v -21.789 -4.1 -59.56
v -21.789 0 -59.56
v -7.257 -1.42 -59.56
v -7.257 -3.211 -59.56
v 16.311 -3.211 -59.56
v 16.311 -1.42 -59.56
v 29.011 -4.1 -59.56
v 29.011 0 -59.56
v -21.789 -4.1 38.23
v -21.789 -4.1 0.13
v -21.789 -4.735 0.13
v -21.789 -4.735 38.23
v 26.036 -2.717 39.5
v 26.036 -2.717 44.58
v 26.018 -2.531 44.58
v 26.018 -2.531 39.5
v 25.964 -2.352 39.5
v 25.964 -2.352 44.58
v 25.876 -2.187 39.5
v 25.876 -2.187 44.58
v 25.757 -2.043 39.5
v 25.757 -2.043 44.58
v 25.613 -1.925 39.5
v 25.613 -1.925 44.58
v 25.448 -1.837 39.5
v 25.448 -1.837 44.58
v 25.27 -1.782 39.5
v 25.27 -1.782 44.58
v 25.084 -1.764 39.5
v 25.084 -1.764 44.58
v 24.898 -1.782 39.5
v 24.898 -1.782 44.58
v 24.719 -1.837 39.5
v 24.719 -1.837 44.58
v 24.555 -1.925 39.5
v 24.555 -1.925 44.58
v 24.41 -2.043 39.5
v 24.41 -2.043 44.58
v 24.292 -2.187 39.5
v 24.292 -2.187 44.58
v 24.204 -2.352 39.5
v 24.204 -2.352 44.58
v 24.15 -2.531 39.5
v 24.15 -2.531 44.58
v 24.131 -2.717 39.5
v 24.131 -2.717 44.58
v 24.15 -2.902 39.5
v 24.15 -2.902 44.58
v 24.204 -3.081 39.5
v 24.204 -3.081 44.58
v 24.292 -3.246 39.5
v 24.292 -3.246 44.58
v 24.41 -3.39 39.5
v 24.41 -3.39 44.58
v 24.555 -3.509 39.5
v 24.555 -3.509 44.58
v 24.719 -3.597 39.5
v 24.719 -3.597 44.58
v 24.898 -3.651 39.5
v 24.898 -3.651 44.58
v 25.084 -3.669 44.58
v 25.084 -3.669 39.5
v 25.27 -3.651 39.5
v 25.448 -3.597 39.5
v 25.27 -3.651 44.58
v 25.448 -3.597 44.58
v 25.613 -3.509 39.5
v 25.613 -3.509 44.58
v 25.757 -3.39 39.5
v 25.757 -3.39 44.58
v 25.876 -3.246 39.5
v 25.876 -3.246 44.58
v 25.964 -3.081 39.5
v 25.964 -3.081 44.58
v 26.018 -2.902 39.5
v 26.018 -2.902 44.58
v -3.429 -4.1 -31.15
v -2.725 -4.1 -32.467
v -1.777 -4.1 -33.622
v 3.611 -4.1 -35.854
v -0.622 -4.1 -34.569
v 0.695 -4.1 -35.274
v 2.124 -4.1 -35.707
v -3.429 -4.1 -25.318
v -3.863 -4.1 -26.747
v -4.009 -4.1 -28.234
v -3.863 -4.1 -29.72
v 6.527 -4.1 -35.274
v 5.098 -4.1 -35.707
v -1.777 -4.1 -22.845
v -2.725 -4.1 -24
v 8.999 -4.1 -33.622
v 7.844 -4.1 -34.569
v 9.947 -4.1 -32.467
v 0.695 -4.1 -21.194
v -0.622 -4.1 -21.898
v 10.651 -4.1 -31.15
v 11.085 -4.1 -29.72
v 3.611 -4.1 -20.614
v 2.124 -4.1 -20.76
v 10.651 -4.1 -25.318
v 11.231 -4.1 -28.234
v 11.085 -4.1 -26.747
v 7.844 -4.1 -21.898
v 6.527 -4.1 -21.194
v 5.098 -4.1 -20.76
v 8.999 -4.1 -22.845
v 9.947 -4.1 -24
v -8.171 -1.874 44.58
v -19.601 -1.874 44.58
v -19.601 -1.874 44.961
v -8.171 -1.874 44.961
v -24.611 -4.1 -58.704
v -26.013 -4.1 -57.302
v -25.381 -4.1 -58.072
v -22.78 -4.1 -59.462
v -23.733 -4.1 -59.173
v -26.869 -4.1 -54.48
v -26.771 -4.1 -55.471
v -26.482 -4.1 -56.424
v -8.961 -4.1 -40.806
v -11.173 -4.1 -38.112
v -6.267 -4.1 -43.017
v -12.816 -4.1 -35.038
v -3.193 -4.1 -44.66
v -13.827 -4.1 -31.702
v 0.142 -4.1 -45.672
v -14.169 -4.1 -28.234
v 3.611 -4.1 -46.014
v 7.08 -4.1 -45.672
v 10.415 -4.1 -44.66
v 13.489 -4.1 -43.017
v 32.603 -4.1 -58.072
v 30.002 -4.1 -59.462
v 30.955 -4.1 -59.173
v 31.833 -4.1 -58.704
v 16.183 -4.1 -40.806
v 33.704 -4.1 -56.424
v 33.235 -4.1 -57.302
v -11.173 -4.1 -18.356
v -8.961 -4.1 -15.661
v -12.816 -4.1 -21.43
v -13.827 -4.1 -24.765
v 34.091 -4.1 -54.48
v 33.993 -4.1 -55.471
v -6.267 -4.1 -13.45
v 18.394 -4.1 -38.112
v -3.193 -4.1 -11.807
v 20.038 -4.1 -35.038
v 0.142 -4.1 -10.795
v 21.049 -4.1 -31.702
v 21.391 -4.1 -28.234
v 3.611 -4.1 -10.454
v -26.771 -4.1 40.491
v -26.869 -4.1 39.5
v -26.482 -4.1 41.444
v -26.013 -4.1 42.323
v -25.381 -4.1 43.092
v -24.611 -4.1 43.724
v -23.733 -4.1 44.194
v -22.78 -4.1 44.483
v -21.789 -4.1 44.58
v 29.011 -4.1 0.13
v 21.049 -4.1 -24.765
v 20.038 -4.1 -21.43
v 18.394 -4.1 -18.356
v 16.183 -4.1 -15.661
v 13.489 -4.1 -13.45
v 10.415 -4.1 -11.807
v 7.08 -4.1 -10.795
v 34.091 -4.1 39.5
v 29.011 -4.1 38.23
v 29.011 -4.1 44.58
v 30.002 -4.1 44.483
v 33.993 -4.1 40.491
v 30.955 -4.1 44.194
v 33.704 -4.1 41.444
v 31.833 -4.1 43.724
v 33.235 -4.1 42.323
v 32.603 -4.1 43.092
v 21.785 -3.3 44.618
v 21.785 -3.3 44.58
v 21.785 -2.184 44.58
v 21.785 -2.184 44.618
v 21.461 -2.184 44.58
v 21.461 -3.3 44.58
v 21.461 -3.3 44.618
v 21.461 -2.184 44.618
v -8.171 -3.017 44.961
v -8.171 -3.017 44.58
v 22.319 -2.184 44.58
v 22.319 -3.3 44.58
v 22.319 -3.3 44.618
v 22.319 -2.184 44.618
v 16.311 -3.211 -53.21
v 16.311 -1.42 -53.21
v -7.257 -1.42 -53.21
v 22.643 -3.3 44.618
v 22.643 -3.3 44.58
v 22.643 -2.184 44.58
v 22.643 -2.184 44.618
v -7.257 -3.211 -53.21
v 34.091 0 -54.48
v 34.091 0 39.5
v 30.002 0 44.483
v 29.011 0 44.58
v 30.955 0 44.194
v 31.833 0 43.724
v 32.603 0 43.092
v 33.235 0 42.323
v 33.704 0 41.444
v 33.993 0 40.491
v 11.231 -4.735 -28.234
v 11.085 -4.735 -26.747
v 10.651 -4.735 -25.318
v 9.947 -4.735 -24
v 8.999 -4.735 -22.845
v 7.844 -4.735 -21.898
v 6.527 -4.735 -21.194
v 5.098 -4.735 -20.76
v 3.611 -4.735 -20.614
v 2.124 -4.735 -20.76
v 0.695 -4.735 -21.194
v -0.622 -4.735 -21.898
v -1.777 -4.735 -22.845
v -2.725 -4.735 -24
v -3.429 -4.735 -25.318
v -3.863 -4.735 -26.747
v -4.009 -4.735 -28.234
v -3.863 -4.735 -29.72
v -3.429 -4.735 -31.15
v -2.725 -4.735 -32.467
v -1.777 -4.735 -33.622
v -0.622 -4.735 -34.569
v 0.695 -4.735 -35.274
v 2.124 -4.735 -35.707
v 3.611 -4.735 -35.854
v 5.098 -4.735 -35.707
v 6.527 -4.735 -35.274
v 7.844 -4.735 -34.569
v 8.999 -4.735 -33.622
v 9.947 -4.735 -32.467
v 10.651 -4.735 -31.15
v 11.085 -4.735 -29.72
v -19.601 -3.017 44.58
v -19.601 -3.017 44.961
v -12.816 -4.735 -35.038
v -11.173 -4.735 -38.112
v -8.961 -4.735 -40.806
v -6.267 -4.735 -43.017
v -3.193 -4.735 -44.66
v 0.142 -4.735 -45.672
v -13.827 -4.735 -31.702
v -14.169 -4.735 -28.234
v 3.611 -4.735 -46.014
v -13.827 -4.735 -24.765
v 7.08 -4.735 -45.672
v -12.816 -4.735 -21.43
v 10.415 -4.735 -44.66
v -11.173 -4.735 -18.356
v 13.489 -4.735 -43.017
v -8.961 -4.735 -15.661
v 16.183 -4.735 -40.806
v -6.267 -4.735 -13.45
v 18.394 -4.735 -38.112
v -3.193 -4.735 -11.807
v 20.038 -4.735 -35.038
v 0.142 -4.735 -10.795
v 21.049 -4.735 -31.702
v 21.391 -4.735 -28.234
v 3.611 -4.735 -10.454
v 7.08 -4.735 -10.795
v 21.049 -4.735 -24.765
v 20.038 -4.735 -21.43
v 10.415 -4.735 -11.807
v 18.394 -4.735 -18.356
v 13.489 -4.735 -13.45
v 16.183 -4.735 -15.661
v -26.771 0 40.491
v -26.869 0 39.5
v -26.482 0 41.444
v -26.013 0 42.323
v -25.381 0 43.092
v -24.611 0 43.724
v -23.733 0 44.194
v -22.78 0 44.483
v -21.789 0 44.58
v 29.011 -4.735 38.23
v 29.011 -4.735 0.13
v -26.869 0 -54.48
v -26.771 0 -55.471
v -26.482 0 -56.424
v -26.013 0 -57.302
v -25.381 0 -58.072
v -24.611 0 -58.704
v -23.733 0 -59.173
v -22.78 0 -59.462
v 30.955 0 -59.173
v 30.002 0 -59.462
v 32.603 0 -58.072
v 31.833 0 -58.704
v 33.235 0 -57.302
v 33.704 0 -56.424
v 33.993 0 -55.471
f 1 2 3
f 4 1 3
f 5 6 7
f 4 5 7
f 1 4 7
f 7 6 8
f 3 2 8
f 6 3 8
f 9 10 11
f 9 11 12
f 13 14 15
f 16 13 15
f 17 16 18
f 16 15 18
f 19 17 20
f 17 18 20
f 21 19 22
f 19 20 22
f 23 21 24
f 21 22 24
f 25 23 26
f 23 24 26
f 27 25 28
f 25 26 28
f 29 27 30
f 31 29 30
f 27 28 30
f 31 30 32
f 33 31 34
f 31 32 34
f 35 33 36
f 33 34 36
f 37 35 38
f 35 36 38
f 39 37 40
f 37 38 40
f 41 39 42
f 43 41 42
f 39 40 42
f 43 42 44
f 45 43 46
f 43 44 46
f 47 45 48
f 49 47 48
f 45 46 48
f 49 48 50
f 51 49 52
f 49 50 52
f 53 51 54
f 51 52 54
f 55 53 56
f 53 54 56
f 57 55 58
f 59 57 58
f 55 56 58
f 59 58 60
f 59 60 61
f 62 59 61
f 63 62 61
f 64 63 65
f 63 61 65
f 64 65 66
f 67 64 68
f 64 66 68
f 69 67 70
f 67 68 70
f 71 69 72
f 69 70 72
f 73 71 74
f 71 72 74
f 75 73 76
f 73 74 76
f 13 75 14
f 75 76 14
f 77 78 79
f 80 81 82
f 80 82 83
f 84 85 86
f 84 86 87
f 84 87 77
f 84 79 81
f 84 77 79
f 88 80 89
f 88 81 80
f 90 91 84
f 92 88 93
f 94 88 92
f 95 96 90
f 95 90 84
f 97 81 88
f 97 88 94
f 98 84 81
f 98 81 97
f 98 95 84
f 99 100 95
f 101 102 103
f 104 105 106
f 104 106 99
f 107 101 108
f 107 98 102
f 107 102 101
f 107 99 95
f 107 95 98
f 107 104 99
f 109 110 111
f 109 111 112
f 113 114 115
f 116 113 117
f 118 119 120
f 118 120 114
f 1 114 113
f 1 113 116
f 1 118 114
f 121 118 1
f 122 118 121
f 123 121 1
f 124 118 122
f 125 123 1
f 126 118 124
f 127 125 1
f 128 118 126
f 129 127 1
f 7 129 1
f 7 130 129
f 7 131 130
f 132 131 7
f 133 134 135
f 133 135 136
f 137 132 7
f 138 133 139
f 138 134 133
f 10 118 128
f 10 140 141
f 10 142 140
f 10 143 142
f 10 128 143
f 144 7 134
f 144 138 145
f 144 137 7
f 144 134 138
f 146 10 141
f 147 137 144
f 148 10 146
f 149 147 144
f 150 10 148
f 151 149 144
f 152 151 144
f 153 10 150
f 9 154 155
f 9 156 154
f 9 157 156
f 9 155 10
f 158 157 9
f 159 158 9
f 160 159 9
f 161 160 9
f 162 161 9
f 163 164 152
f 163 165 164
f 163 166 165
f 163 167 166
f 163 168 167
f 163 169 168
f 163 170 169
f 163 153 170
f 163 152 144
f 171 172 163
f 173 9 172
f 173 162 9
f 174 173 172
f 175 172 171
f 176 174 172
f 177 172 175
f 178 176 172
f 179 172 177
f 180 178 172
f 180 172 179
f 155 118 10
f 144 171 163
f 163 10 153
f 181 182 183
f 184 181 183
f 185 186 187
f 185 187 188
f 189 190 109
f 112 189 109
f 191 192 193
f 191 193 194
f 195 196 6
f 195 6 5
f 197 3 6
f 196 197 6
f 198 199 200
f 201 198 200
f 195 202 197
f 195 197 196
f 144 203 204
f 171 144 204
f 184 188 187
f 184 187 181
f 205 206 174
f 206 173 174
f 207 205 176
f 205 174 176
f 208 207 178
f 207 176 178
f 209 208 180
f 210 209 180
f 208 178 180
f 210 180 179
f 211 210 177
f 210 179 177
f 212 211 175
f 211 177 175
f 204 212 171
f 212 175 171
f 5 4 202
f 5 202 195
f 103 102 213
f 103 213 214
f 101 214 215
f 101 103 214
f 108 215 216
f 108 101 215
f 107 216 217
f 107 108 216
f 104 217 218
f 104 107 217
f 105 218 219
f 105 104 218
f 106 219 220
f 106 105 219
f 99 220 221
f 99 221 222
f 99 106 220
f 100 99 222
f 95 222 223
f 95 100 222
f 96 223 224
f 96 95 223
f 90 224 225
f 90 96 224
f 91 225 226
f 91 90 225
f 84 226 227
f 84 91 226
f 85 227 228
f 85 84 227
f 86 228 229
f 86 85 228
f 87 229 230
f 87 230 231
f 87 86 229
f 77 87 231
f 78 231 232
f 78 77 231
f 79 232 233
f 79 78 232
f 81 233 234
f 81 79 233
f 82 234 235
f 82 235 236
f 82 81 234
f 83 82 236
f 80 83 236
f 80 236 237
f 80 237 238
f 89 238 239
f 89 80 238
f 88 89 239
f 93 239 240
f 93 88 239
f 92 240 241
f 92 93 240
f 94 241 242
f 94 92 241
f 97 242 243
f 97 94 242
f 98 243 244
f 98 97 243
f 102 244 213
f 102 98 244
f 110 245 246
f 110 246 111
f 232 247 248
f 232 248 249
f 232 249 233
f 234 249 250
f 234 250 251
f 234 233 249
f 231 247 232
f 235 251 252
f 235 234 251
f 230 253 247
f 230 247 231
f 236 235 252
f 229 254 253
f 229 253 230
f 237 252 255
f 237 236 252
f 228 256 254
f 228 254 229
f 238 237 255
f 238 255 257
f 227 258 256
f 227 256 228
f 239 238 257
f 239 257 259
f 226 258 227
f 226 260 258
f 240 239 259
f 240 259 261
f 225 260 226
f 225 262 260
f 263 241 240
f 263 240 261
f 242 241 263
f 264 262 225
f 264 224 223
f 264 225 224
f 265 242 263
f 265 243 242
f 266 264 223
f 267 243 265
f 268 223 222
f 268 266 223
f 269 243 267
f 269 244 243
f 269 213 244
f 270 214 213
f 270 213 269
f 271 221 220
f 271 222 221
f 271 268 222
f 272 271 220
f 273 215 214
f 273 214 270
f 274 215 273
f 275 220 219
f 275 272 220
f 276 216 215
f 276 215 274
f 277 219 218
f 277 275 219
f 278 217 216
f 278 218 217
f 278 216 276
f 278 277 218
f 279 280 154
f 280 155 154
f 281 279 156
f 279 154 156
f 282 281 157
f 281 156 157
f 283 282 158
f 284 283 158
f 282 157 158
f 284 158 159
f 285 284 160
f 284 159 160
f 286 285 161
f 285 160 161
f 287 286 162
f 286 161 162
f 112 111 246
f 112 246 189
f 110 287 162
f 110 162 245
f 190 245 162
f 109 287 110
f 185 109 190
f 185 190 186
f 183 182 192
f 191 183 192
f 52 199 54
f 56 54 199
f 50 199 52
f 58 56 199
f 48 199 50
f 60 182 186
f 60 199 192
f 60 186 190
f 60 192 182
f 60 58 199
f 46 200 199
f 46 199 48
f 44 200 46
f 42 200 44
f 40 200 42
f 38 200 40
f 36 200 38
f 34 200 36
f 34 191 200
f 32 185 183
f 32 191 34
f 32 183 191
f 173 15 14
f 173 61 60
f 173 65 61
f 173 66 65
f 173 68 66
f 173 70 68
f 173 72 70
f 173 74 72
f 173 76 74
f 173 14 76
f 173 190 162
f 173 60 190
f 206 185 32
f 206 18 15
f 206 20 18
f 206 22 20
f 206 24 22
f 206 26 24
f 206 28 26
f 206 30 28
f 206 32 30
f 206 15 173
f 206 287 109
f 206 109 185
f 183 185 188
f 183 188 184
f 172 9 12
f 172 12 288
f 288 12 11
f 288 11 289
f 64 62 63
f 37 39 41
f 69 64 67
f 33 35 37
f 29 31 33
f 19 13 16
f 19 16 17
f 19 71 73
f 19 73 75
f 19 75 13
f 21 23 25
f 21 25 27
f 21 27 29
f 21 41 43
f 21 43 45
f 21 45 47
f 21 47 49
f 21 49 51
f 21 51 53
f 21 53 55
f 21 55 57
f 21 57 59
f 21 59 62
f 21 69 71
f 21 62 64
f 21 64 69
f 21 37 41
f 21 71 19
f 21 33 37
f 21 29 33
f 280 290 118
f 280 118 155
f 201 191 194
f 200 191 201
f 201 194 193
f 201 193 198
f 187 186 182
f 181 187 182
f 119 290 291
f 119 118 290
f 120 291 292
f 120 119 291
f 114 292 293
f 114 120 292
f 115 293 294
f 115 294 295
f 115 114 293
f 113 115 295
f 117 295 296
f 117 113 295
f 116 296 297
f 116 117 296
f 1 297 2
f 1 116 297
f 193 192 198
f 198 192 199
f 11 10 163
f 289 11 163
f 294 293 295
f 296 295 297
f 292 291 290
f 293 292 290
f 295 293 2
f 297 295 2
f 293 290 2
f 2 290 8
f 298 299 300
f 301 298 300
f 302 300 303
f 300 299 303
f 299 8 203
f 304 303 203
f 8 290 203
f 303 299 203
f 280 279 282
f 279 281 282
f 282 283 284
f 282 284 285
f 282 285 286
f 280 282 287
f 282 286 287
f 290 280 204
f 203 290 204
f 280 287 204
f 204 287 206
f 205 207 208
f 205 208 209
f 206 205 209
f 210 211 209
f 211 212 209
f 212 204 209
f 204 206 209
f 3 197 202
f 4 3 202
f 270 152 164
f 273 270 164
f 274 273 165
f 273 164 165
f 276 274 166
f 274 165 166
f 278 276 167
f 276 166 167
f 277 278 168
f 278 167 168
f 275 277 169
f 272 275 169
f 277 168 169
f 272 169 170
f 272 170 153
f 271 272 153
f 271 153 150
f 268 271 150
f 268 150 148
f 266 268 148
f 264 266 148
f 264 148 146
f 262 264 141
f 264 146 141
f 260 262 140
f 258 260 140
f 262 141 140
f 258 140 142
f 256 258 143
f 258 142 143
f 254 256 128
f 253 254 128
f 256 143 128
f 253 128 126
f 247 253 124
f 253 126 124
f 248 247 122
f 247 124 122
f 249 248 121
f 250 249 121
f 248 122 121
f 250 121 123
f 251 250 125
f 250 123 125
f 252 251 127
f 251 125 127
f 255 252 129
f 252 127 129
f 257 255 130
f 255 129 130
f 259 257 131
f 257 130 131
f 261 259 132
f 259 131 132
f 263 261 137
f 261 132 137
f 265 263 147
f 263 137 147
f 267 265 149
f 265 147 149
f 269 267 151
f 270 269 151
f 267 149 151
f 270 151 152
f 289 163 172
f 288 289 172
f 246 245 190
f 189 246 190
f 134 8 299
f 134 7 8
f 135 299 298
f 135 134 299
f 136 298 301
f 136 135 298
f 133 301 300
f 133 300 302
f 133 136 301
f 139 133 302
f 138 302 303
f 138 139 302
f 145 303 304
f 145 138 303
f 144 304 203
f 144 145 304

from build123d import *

# Parameters (mm, degrees)
F0_W      = 60.96
F0_H      = 104.14
F1_DEPTH  = 4.1
F2_W      = 50.8
F2_H      = 38.1
F2_R      = 17.78
F2_R_2    = 7.62
F3_DEPTH  = 0.635
F4_R      = 5.08
F5_R      = 1.27
F6_DEPTH  = 3.81
F7_W      = 0.127
F7_H      = 0.635
F7_H_2    = 0.641739
F8_DEPTH  = 0.0635
F9_W      = 23.568134
F9_H      = 1.790789
F10_DEPTH = 6.35
F11_W     = 11.43
F11_H     = 1.143
F12_DEPTH = 0.381
F13_R     = 0.9525
F14_DEPTH = 5.08
F15_W     = 0.323782
F15_H     = 1.115247
F15_W_2   = 0.323781
F16_DEPTH = 0.0381


with BuildPart() as f1:
    # F0 (on Front) → F1 (new body)
    with BuildSketch(Plane.XZ):
        with Locations((3.610969, -7.489684)):
            Rectangle(F0_W, F0_H)
    extrude(amount=F1_DEPTH)

    # F2 (on face) → F3 (join)
    with BuildSketch(Plane.XZ.offset(4.1)):
        with Locations((3.610969, 19.180316)):
            Rectangle(F2_W, F2_H)
        with Locations((3.610969, -28.233618)):
            Circle(F2_R)
        with Locations((3.610969, -28.233618)):
            Circle(F2_R_2, mode=Mode.SUBTRACT)
    extrude(amount=F3_DEPTH)

    # F4
    f4_edges = [f1.edges().sort_by_distance(p)[0] for p in [
        (-26.869031, -2.05, 44.580316),
        (34.090969, -2.05, 44.580316),
        (34.090969, -2.05, -59.559684),
        (-26.869031, -2.05, -59.559684),
    ]]
    fillet(f4_edges, radius=F4_R)

    # F5 (on face) → F6 (cut)
    with BuildSketch(Plane.XY.offset(44.580316)):
        with Locations((25.835969, -8.355387)):
            Circle(F5_R)
    extrude(amount=-F6_DEPTH, mode=Mode.SUBTRACT)

    # F7 (on face) → F8 (cut)
    with BuildSketch(Plane.XY.offset(44.580316)):
        with Locations((23.406764, -8.501846)):
            Rectangle(F7_W, F7_H)
        with Locations((23.75507, -8.505765)):
            Rectangle(F7_W, F7_H_2)
    extrude(amount=-F8_DEPTH, mode=Mode.SUBTRACT)

    # F9 (on face) → F10 (cut)
    with BuildSketch(Plane(origin=(0, 0, -59.559684), x_dir=(1, 0, 0), z_dir=(0, 0, -1))):
        with Locations((4.526902, 2.315605)):
            Rectangle(F9_W, F9_H)
    extrude(amount=-F10_DEPTH, mode=Mode.SUBTRACT)

    # F11 (on face) → F12 (join)
    with BuildSketch(Plane.XY.offset(44.580316)):
        with Locations((-13.885994, -2.445143)):
            Rectangle(F11_W, F11_H)
    extrude(amount=F12_DEPTH)

    # F13 (on face) → F14 (cut)
    with BuildSketch(Plane.XY.offset(44.580316)):
        with Locations((25.083786, -2.716642)):
            Circle(F13_R)
    extrude(amount=-F14_DEPTH, mode=Mode.SUBTRACT)

    # F15 (on face) → F16 (join)
    with BuildSketch(Plane.XY.offset(44.580316)):
        with Locations((21.622912, -2.742082)):
            Rectangle(F15_W, F15_H)
        with Locations((22.481088, -2.742082)):
            Rectangle(F15_W_2, F15_H)
    extrude(amount=F16_DEPTH)


solid = f1.part
